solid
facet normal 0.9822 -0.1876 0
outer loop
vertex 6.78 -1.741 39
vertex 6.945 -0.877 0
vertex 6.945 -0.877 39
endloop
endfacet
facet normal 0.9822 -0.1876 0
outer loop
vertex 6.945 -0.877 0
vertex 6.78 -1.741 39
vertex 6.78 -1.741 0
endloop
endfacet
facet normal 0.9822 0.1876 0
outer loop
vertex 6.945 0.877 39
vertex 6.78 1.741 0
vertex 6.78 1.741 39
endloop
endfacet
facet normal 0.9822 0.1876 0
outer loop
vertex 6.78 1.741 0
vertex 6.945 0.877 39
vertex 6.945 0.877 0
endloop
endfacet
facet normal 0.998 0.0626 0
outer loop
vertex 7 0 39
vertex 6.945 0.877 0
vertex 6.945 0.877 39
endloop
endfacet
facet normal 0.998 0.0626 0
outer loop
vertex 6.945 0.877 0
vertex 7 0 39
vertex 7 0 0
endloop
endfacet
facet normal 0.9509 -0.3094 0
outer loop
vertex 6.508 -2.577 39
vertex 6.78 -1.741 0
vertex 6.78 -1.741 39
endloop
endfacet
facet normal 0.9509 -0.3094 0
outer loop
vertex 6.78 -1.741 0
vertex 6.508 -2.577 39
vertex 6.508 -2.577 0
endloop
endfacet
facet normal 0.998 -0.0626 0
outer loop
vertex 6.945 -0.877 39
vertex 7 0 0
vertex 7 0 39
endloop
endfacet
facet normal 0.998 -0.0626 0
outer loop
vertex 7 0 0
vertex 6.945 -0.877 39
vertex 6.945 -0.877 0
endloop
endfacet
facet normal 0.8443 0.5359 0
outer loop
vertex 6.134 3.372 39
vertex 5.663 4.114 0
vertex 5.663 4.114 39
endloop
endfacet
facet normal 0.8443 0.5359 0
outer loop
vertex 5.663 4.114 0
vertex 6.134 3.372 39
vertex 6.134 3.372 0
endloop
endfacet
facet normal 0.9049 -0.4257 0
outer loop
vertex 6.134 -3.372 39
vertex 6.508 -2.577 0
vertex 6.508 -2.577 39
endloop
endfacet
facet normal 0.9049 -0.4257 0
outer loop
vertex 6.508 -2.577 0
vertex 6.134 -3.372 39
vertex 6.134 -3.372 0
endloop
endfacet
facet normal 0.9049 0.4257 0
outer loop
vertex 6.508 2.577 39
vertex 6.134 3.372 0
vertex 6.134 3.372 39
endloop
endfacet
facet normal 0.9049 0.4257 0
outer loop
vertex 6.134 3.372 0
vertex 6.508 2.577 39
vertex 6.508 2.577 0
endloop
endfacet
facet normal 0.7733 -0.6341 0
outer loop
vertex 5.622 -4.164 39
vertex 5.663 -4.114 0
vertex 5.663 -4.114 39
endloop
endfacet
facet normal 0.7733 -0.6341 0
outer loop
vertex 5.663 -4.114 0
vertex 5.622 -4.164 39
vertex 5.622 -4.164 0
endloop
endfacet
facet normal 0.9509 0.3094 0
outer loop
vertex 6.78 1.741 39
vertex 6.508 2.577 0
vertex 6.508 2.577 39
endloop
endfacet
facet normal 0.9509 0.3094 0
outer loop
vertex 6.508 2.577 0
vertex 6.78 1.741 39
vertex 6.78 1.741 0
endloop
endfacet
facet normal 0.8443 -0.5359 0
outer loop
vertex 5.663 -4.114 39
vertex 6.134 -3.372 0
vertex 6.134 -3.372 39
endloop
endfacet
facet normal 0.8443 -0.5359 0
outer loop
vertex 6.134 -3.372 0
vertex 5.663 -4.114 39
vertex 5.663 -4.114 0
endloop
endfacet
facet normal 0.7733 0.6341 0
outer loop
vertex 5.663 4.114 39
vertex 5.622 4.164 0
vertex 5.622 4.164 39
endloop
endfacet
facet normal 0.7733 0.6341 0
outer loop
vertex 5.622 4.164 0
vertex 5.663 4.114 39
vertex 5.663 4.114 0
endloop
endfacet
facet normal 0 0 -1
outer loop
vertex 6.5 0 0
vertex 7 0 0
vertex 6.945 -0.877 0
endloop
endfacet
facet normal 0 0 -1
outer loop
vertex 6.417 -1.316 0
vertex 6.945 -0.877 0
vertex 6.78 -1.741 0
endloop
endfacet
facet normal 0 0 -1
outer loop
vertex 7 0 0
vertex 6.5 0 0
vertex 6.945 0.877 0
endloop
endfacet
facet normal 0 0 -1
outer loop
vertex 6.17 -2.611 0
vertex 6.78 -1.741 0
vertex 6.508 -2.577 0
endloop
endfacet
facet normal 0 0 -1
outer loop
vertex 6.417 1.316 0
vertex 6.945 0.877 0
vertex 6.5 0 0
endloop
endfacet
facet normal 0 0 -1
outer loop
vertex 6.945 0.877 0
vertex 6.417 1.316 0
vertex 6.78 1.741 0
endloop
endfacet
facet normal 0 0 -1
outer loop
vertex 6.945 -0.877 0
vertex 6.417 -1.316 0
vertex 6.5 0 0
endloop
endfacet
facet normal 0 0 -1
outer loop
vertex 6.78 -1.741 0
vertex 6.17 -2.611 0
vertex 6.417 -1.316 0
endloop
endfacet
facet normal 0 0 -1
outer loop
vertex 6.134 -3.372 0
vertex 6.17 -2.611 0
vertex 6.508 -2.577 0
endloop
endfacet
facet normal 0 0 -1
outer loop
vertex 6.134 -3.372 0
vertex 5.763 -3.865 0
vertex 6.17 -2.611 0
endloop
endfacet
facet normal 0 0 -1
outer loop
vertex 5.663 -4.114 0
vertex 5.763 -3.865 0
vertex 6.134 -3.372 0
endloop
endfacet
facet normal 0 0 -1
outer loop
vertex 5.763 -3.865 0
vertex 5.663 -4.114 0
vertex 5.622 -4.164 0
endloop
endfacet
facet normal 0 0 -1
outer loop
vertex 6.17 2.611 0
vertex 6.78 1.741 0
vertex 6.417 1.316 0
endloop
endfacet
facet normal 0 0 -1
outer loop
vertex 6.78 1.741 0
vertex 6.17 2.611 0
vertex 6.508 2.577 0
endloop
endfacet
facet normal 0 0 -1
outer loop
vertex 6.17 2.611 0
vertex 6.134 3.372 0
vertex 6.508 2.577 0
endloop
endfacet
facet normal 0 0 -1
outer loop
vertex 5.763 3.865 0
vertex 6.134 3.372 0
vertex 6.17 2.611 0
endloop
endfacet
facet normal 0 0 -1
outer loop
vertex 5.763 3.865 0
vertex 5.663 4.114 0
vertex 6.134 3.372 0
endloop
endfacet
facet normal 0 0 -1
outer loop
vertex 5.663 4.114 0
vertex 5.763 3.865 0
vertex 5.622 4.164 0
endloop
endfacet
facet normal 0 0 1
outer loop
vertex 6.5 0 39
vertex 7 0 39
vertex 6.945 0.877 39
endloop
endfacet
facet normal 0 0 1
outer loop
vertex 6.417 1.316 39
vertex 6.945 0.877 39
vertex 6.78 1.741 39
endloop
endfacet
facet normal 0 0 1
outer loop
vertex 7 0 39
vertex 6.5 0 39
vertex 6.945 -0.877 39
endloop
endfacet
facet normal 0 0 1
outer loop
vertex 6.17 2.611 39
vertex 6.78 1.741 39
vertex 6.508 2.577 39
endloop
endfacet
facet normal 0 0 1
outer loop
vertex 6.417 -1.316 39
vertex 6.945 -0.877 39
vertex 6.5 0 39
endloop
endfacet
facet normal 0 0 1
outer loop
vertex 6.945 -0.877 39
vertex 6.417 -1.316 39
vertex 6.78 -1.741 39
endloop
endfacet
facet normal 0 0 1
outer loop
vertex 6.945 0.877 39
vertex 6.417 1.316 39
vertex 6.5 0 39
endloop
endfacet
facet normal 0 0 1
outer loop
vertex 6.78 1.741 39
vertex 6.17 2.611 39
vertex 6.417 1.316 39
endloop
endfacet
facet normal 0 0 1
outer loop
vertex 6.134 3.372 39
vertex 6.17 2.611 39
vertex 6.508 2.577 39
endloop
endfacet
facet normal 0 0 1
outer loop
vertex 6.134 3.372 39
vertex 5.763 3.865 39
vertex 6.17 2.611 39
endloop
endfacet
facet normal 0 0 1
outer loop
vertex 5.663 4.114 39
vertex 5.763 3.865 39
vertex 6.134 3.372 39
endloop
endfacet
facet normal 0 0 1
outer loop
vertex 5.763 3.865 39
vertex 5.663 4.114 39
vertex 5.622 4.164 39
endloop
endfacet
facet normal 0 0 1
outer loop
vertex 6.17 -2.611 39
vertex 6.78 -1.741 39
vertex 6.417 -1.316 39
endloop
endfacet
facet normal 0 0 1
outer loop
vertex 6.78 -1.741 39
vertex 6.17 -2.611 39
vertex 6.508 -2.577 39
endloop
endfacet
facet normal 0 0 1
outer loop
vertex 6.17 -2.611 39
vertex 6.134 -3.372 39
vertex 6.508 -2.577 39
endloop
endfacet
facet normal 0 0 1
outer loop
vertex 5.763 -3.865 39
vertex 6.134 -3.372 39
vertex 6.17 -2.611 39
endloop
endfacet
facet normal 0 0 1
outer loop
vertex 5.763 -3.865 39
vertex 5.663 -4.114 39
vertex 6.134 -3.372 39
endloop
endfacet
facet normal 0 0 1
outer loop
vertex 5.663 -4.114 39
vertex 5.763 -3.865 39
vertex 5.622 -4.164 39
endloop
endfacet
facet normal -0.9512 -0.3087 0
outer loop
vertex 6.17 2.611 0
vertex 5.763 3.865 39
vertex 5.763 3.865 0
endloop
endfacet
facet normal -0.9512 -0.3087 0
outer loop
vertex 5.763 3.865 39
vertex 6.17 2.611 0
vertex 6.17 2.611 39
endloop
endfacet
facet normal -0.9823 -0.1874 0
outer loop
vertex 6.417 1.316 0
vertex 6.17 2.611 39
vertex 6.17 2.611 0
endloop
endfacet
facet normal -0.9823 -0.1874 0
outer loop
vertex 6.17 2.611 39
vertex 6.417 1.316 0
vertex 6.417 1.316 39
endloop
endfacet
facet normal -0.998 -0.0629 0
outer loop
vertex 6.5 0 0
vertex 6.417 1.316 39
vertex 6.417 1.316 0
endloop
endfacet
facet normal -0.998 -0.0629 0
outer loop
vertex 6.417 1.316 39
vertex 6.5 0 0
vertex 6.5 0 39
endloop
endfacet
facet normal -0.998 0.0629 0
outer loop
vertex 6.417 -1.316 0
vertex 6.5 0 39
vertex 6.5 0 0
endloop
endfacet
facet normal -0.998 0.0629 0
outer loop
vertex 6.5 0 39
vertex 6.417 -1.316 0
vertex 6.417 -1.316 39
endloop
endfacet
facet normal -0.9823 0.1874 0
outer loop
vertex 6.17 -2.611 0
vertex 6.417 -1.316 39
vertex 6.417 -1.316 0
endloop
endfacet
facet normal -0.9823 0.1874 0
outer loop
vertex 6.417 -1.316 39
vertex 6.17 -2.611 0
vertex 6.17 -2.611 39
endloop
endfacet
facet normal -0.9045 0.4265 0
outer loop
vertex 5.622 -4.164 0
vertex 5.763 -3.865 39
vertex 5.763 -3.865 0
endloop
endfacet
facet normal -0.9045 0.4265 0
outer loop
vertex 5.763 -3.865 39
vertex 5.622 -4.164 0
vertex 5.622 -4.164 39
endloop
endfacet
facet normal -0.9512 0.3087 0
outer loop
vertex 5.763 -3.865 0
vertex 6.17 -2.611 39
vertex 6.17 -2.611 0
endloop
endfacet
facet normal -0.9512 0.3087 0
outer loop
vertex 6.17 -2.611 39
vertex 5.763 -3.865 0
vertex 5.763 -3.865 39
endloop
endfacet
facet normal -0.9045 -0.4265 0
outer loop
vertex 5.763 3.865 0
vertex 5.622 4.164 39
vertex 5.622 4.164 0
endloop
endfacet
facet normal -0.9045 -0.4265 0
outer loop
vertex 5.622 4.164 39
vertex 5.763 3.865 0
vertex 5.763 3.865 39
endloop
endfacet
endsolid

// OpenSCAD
$fn = 50;


difference() {
	union() {
		cylinder(h = 39, r = 7.0000000000);
		translate(v = [-7.0000000000, 0, 0]) {
			cylinder(h = 39, r = 7.0000000000);
		}
	}
	union() {
		cylinder(h = 39, r = 3.2500000000);
		cylinder(h = 39, r = 1.8000000000);
		cylinder(h = 39, r = 1.8000000000);
		cylinder(h = 39, r = 1.8000000000);
		translate(v = [-11.5000000000, 0, 0]) {
			hull() {
				translate(v = [-3.7500000000, 0.0000000000, 0]) {
					cylinder(h = 39, r = 10.5000000000);
				}
				translate(v = [3.7500000000, 0.0000000000, 0]) {
					cylinder(h = 39, r = 10.5000000000);
				}
				translate(v = [-3.7500000000, -0.0000000000, 0]) {
					cylinder(h = 39, r = 10.5000000000);
				}
				translate(v = [3.7500000000, -0.0000000000, 0]) {
					cylinder(h = 39, r = 10.5000000000);
				}
			}
		}
		translate(v = [-4.0000000000, 0, 0.0000000000]) {
			cylinder(h = 39, r = 10.5000000000);
		}
	}
}
